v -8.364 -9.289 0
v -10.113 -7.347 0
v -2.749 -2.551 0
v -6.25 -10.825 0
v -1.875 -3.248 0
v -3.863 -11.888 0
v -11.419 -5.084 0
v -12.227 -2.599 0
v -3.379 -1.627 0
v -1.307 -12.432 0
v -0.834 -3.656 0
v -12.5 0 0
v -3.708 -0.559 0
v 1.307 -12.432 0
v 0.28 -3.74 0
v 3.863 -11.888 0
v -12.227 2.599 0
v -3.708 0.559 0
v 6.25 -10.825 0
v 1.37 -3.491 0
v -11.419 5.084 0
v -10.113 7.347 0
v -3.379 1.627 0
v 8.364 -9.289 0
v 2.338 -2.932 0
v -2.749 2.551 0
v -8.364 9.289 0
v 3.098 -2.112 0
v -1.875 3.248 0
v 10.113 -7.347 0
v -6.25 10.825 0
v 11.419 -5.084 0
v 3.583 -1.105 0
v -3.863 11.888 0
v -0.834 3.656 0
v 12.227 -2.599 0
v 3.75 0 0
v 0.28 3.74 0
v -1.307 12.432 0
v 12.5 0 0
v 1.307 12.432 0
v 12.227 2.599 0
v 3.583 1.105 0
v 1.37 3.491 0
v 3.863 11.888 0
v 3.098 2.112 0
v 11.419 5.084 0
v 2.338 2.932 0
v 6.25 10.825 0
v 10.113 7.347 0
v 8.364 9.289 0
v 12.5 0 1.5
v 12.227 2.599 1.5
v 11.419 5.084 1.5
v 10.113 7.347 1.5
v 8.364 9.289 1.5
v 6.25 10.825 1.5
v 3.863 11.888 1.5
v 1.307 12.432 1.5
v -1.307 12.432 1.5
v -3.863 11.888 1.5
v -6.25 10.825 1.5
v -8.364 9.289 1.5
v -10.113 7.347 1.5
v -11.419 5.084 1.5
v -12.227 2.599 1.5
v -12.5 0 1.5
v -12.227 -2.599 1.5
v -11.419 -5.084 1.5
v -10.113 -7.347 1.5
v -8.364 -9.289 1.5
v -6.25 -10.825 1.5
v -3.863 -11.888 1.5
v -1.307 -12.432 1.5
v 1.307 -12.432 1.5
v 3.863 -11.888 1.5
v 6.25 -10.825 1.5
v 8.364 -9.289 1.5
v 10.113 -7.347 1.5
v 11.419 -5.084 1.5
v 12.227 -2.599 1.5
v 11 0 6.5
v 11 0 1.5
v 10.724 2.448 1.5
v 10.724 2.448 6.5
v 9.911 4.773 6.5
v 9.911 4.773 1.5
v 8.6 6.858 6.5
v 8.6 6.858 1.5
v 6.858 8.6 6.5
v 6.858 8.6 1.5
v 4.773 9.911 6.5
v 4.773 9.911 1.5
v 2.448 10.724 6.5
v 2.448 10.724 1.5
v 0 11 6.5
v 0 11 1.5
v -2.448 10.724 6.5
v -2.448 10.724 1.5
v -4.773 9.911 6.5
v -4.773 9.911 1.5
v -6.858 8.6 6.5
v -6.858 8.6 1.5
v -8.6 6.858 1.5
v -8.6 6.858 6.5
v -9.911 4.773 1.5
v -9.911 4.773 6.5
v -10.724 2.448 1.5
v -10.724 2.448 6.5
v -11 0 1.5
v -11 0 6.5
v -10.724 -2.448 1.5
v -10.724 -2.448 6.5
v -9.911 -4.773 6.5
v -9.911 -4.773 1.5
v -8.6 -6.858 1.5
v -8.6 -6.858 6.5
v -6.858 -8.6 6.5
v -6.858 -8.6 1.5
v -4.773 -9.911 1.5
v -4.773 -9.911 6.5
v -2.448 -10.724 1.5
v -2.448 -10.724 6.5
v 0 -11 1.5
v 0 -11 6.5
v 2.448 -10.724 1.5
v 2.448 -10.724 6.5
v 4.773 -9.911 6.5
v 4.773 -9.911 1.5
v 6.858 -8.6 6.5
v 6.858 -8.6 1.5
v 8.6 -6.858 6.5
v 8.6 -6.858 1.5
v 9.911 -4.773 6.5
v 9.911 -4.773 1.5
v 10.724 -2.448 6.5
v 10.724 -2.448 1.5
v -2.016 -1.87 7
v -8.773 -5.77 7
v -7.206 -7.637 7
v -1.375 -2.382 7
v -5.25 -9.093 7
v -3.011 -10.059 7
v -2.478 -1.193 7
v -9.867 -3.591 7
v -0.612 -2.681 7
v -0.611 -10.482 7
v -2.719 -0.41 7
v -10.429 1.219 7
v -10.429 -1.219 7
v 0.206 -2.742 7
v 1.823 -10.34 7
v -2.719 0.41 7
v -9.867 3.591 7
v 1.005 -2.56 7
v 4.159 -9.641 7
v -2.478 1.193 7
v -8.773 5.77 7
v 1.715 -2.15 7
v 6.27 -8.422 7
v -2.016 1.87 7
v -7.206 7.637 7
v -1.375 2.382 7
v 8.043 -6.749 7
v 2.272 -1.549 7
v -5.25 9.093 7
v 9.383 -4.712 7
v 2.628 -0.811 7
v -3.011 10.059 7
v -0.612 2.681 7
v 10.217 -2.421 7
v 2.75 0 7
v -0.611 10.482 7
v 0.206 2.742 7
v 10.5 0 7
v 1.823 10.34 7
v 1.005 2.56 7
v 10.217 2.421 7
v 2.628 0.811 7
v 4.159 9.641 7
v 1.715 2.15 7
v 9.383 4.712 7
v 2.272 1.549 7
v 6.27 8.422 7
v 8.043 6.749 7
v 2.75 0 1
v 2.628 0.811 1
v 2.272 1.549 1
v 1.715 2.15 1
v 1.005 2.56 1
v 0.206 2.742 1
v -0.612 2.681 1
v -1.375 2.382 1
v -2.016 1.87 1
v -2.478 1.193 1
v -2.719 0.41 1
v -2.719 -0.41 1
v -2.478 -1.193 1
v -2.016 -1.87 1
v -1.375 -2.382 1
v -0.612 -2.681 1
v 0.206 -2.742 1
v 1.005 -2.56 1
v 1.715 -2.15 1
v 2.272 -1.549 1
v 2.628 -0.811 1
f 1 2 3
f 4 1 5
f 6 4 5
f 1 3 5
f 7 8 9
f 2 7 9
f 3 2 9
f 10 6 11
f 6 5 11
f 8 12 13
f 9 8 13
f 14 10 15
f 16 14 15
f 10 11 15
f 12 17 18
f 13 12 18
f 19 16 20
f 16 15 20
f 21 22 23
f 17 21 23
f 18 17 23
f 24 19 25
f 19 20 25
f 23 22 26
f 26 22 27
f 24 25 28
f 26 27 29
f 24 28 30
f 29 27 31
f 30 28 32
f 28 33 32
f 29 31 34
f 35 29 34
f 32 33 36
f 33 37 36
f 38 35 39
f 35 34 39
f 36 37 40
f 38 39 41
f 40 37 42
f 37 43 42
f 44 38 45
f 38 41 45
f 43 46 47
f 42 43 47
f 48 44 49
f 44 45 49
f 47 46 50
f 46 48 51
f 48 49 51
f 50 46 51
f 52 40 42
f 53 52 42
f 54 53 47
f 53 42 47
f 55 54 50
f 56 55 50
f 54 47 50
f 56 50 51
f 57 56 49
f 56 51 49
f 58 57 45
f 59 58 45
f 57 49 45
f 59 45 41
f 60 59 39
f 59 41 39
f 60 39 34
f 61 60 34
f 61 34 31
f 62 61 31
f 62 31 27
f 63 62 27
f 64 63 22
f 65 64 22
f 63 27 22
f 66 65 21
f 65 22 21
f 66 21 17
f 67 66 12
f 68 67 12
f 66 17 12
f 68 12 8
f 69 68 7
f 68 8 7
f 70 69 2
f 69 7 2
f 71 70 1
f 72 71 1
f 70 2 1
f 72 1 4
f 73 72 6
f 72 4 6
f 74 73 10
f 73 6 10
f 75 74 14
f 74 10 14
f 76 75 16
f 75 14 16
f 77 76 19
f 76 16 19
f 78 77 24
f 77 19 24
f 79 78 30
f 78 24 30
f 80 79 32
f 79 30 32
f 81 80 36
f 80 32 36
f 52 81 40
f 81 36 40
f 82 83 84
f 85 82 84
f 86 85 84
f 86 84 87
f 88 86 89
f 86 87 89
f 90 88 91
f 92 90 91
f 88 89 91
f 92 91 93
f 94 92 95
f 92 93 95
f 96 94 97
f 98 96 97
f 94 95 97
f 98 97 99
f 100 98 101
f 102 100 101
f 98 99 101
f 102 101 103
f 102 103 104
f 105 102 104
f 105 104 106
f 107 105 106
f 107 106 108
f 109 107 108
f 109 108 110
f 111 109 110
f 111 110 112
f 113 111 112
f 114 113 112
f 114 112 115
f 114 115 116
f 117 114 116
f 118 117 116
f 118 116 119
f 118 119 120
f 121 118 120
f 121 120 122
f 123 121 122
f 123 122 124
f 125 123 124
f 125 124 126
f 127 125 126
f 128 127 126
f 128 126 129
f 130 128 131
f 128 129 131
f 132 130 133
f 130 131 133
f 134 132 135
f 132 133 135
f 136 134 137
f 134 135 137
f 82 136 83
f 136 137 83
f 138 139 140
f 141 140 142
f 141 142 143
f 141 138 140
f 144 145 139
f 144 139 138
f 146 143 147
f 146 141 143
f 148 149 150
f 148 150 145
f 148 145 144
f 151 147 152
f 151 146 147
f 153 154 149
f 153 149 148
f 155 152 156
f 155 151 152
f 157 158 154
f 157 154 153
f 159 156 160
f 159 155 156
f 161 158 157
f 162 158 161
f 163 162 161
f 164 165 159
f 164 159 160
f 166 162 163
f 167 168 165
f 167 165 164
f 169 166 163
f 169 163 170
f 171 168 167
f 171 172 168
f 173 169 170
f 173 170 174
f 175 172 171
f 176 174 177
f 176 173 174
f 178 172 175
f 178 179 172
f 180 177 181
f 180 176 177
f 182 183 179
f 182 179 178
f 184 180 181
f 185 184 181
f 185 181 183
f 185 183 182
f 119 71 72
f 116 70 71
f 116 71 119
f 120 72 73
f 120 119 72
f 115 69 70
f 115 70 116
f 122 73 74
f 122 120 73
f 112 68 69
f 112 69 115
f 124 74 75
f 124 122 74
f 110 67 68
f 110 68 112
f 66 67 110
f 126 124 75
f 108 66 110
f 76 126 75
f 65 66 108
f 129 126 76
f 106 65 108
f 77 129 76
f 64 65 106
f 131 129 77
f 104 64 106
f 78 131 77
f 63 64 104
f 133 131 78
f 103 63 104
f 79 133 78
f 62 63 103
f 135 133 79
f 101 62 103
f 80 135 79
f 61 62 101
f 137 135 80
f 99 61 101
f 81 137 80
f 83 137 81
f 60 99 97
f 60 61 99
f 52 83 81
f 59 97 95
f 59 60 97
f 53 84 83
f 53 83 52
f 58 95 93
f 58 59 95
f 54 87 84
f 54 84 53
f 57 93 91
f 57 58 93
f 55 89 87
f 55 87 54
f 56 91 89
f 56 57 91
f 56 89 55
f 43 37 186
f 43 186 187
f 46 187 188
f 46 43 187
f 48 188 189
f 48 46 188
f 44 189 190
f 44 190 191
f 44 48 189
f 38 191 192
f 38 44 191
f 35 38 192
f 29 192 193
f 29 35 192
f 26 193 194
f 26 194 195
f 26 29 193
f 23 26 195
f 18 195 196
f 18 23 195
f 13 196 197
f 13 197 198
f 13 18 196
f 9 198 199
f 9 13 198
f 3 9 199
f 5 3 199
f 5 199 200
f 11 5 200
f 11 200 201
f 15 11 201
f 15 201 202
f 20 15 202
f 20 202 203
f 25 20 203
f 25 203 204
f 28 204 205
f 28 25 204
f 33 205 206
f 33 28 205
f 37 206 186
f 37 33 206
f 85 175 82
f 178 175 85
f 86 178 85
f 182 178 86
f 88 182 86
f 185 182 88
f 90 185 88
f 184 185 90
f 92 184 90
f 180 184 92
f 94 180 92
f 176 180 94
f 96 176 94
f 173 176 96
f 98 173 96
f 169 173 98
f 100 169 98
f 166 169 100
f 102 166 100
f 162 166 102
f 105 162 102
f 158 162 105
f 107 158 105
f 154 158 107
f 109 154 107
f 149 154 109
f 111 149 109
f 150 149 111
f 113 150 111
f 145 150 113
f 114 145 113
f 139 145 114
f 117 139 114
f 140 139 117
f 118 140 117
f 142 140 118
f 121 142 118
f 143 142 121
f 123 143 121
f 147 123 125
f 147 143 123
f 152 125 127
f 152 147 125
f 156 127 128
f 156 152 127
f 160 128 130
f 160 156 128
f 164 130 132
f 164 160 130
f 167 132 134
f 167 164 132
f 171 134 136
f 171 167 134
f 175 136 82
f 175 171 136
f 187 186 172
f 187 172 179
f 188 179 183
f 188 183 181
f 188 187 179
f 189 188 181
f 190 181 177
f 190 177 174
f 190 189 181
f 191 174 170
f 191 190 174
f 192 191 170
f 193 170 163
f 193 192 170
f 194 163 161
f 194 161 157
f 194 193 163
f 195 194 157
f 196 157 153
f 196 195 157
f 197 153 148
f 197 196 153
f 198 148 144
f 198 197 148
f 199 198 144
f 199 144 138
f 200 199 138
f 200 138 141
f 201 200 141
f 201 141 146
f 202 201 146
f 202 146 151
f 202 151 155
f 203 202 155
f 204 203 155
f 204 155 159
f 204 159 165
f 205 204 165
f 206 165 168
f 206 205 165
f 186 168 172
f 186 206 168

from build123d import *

# Parameters (mm, degrees)
F0_R     = 11
F0_R_2   = 2.75
F1_DEPTH = 7
F0_R_3   = 12.5
F2_DEPTH = 1.5
F3_SIZE  = 0.5
F4_SIZE  = 1


with BuildPart() as f1:
    # F0 (on Top) → F1 (new body)
    with BuildSketch(Plane.XY):
        Circle(F0_R)
        Circle(F0_R_2, mode=Mode.SUBTRACT)
    extrude(amount=F1_DEPTH)

    # F0 (on Top) → F2 (join)
    with BuildSketch(Plane.XY):
        Circle(F0_R_3)
        Circle(F0_R, mode=Mode.SUBTRACT)
    extrude(amount=F2_DEPTH)

    # F3
    f3_edges = [f1.edges().sort_by_distance(p)[0] for p in [
        (-11, 0, 7),
    ]]
    chamfer(f3_edges, length=F3_SIZE)

    # F4
    f4_edges = [f1.edges().sort_by_distance(p)[0] for p in [
        (-2.75, 0, 0),
    ]]
    chamfer(f4_edges, length=F4_SIZE)


solid = f1.part
